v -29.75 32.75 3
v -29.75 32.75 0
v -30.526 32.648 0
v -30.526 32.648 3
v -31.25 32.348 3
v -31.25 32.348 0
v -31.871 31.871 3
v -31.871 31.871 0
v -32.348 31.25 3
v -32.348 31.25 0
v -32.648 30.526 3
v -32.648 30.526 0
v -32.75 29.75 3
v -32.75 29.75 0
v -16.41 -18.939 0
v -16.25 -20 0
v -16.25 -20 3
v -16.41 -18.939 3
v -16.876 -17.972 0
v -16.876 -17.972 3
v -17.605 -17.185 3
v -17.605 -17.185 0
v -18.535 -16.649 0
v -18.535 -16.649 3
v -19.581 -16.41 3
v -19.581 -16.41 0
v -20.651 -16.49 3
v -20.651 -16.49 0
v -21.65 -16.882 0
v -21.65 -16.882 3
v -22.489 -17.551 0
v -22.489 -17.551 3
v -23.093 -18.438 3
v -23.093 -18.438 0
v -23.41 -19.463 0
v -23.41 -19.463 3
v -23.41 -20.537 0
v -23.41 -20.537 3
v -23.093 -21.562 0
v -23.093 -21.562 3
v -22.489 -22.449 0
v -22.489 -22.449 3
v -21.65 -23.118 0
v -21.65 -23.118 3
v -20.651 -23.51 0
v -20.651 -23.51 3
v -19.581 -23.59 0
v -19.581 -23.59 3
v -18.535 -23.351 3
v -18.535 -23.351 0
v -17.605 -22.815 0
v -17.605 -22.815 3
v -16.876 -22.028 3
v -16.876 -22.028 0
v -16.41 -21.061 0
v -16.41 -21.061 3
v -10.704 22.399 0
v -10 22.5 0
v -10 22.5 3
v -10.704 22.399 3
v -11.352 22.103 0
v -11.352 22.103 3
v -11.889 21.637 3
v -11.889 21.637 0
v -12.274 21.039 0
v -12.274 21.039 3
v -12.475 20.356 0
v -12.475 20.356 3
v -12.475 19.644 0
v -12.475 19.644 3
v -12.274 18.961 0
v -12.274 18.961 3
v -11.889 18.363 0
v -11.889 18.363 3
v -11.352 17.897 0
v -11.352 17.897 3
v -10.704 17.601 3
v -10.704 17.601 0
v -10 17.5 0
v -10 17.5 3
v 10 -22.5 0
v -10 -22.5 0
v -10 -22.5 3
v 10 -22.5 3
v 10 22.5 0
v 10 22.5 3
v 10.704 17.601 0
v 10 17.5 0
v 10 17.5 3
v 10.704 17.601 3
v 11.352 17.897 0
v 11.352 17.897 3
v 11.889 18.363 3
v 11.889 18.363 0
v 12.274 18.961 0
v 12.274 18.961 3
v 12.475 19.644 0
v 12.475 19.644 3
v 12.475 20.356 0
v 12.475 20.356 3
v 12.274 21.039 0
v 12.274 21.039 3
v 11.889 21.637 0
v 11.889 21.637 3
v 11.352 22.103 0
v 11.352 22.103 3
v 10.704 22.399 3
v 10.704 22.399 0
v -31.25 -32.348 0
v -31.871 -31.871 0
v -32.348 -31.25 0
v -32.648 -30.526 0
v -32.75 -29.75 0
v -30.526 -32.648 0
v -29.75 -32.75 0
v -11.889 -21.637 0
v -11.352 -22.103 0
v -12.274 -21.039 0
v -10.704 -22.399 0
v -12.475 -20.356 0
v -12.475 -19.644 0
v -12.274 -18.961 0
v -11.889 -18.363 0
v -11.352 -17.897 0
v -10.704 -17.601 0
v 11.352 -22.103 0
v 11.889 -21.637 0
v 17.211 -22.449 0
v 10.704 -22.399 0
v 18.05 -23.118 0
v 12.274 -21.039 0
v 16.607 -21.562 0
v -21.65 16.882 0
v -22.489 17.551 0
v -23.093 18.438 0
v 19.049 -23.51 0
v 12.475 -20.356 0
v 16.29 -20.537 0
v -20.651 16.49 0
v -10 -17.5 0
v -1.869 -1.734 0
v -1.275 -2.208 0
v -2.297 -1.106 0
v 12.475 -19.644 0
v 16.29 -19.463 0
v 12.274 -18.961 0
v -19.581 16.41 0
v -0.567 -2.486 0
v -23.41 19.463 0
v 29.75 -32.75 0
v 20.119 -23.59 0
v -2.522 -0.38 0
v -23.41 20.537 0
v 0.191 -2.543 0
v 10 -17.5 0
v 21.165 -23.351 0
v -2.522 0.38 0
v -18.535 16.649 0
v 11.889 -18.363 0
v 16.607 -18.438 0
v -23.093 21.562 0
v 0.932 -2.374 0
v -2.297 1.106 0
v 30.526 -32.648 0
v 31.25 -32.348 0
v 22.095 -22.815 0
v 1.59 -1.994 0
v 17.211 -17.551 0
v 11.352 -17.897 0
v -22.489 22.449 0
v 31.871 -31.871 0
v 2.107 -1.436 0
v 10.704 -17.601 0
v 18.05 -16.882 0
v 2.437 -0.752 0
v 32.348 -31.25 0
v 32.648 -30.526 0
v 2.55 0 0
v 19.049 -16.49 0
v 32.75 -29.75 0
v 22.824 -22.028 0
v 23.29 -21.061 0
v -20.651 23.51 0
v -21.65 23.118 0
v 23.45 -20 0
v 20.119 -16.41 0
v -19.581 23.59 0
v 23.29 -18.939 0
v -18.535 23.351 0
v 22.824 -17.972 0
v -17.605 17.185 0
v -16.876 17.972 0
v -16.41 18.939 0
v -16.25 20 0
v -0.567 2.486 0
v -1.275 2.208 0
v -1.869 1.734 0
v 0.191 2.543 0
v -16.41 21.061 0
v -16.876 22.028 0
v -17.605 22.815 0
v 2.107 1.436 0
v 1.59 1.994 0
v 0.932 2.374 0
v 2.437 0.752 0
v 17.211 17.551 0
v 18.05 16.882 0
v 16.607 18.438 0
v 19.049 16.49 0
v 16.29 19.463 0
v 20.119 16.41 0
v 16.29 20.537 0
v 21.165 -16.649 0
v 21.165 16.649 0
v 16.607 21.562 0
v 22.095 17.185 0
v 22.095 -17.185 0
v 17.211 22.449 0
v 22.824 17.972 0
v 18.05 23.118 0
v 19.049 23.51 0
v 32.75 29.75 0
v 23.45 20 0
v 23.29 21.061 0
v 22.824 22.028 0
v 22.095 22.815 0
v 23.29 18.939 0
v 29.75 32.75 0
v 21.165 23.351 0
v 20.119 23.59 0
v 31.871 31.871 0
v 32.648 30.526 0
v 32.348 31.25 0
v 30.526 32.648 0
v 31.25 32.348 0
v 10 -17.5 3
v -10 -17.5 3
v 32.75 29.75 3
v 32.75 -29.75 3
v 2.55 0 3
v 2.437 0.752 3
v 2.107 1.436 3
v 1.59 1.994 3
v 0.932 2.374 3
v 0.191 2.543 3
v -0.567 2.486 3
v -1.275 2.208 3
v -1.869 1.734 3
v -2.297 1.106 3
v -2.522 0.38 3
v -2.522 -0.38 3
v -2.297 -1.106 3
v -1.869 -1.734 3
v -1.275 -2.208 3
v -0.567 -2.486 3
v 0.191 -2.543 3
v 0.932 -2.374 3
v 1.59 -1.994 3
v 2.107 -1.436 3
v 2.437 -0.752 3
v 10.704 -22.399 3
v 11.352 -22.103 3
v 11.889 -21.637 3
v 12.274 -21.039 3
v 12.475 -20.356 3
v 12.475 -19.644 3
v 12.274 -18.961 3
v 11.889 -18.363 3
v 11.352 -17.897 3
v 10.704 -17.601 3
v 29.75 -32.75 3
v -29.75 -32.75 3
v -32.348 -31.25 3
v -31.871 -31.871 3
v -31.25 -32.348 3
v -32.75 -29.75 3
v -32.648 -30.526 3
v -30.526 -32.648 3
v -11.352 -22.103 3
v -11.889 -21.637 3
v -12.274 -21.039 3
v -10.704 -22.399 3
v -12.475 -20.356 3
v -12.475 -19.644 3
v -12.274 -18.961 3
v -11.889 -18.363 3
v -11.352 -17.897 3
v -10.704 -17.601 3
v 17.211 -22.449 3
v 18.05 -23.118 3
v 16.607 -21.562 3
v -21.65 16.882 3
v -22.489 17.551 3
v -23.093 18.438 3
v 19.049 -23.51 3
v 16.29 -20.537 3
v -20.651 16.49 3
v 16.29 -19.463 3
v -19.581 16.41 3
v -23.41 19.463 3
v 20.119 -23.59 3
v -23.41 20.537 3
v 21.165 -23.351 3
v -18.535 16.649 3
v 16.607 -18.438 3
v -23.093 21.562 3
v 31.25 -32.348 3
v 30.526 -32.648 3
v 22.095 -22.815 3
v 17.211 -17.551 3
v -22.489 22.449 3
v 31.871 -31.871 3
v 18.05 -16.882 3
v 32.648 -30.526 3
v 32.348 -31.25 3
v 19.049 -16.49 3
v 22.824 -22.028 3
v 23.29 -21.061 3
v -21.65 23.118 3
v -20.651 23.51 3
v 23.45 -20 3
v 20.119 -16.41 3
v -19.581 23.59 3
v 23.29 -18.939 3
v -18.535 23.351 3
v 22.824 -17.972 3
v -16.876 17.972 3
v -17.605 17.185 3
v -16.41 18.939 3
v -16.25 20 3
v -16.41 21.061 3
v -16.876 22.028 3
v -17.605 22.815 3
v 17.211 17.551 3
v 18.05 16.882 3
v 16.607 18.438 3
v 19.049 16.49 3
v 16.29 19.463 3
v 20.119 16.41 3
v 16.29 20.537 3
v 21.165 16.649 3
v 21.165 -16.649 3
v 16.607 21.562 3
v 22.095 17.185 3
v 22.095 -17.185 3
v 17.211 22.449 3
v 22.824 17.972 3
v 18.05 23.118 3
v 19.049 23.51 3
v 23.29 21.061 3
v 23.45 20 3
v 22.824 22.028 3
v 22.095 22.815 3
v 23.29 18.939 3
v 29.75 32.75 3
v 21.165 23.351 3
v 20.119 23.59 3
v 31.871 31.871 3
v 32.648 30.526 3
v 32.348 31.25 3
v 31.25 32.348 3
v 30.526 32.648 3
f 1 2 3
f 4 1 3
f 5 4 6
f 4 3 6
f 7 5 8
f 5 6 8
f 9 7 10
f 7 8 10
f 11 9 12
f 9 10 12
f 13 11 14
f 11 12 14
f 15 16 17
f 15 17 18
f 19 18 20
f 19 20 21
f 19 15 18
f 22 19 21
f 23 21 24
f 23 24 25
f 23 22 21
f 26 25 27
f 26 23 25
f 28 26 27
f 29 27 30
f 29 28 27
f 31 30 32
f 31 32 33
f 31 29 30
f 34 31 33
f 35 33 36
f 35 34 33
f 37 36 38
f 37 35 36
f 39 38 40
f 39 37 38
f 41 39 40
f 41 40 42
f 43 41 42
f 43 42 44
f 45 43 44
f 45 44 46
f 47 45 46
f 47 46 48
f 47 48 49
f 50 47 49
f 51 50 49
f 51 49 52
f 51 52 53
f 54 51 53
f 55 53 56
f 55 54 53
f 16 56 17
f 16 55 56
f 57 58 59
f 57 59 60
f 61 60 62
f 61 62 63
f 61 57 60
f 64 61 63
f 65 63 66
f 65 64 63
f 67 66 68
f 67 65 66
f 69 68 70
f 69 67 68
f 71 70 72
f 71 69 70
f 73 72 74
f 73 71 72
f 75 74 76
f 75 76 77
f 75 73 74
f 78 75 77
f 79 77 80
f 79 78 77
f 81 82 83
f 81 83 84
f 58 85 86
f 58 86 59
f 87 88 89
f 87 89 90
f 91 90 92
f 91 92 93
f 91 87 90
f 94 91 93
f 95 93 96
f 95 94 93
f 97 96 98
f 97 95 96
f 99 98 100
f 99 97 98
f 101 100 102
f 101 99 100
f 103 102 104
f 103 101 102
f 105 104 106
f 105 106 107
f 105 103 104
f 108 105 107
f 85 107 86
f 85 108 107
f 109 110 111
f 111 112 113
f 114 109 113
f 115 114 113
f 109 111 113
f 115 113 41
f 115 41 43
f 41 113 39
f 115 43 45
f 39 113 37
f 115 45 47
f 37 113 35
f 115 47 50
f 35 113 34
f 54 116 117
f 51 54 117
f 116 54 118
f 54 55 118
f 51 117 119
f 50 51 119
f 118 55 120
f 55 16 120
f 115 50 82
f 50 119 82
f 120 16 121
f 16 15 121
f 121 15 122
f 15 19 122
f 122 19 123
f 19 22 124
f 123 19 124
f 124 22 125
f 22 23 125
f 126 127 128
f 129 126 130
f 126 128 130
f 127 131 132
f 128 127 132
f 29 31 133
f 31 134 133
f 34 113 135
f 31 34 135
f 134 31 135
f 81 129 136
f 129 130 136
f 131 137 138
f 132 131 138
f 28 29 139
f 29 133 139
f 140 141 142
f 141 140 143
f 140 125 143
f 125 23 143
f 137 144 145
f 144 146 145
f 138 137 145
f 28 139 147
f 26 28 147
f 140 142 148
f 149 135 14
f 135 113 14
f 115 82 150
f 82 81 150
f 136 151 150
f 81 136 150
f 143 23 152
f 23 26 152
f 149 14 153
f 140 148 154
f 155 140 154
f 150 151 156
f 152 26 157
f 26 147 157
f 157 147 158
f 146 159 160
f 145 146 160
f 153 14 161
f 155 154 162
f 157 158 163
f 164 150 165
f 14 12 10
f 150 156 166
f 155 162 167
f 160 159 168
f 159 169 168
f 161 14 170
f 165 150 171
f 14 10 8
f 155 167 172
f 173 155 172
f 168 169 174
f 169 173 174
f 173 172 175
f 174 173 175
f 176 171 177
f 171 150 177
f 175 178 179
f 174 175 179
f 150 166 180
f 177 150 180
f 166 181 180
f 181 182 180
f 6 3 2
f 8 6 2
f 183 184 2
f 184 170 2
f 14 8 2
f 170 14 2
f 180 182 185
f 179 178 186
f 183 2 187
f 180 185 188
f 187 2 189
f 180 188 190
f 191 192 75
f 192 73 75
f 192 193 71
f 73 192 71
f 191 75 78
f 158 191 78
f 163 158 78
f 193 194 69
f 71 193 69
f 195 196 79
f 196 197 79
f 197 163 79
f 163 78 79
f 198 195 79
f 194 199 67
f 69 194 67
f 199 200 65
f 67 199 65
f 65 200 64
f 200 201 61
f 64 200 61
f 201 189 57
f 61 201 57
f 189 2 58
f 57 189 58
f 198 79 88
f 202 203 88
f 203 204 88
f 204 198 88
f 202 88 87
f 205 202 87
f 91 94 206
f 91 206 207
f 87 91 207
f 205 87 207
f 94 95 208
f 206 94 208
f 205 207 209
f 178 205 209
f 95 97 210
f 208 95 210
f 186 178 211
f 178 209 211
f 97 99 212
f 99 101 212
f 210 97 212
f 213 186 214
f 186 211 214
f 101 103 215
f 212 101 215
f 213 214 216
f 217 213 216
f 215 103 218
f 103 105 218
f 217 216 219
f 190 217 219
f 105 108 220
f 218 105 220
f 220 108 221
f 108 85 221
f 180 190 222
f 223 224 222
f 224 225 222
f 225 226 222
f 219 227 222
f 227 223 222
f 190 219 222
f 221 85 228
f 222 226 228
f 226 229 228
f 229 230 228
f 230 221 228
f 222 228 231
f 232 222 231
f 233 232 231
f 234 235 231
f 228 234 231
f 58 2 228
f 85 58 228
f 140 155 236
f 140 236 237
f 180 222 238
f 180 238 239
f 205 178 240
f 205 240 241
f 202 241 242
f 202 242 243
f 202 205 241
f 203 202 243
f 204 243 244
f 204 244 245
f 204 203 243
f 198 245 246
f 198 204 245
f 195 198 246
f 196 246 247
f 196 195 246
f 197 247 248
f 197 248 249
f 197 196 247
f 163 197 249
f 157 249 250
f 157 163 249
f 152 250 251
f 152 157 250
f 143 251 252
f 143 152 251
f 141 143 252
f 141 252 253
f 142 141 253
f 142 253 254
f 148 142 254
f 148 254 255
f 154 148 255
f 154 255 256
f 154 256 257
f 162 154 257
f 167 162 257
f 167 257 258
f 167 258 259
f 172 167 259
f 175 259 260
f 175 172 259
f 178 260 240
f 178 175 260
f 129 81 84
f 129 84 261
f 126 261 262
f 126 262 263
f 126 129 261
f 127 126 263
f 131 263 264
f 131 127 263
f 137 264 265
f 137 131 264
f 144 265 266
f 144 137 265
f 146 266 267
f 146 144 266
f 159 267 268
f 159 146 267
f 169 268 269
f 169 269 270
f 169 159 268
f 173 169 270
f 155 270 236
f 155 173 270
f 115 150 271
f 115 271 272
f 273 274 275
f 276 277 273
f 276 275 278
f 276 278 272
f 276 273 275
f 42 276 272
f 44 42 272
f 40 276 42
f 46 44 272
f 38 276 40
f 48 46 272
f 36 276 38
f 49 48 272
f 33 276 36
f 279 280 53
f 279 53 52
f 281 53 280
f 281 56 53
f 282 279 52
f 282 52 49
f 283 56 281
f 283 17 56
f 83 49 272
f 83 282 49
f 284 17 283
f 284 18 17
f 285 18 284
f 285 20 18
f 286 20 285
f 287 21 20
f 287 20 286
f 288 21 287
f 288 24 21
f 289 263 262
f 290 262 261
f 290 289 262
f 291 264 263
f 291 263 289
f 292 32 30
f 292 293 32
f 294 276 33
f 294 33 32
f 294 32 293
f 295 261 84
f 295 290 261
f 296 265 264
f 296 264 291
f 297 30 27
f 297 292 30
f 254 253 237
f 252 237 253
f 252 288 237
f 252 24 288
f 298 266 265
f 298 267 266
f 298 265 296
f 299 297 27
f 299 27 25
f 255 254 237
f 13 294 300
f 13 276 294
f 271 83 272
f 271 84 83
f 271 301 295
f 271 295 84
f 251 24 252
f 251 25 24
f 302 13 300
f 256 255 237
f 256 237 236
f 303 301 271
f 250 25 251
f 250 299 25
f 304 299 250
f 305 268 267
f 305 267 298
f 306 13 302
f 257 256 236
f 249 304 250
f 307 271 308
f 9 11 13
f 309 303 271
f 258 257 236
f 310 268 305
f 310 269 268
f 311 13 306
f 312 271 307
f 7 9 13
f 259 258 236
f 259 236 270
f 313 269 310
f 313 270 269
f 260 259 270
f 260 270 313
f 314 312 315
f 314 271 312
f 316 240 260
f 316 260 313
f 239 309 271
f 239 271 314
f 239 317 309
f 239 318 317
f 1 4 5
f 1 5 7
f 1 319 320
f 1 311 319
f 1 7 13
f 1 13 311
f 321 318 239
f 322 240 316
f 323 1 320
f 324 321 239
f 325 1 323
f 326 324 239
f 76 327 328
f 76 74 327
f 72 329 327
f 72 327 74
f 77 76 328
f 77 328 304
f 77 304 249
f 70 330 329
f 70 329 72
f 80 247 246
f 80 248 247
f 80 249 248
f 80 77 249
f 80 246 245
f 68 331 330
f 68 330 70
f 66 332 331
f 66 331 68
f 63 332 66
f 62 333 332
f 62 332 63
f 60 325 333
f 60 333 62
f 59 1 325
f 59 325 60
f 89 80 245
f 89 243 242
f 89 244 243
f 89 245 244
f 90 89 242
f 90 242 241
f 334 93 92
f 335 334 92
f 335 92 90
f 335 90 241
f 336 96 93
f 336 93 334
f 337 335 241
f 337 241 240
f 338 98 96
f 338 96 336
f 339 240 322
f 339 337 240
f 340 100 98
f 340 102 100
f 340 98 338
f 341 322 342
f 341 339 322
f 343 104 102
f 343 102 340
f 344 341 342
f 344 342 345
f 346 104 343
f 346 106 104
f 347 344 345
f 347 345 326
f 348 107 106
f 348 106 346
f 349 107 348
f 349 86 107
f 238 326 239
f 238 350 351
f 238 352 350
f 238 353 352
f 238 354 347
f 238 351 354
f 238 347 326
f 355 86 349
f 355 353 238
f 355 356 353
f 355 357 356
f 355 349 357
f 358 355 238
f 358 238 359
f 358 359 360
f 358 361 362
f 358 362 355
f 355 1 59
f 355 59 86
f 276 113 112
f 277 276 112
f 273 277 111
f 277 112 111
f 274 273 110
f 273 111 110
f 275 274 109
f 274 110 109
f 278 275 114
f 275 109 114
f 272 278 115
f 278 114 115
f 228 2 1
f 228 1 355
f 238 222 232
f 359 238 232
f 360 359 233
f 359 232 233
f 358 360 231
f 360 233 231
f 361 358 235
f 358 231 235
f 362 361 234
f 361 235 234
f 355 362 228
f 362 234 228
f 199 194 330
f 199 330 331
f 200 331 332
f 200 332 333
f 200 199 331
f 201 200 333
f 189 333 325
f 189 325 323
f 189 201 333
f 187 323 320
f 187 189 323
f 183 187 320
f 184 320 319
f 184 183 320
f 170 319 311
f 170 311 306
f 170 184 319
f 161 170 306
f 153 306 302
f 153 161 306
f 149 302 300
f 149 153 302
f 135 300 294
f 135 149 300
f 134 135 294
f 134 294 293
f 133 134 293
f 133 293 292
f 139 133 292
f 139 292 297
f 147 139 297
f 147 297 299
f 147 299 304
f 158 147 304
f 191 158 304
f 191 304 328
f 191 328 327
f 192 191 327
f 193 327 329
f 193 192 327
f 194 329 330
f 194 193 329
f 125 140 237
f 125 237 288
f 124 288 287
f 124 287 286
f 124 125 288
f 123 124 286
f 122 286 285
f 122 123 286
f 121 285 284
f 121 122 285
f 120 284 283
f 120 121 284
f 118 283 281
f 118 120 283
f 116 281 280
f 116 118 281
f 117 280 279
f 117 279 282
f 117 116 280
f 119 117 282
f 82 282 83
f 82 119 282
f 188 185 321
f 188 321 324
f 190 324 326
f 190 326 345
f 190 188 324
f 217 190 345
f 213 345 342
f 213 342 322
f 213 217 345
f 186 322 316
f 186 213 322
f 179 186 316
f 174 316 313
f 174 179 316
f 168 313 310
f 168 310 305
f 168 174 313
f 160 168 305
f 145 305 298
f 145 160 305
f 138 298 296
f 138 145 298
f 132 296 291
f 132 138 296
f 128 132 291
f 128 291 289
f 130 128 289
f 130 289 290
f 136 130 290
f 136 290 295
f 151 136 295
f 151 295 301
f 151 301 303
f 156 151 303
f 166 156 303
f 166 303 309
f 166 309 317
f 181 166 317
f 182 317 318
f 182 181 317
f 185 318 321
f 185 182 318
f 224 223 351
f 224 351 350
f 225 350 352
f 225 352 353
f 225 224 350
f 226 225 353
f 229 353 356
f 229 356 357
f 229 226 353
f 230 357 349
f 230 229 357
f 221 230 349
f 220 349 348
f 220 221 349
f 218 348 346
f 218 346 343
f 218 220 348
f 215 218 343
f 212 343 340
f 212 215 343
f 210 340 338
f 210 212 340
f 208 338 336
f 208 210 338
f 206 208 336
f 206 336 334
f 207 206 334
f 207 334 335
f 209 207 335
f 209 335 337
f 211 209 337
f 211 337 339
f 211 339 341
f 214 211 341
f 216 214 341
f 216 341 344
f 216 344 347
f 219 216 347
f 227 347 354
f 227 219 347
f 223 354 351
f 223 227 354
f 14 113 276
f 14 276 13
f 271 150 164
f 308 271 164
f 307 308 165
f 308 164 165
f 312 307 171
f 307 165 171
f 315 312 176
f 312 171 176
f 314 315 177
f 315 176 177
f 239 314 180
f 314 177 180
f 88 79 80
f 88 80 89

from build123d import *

# Parameters (mm, degrees)
SKETCH_R   = 2.55
SKETCH_R_2 = 3.6
PAD_DEPTH  = 3


with BuildPart() as part:
    # Sketch → Pad (new body)
    with BuildSketch(Plane.XY):
        with BuildLine():
            ThreePointArc((-29.75, 32.75), (-31.87132, 31.87132), (-32.75, 29.75))
            Line((-32.75, -29.75), (-32.75, 29.75))
            ThreePointArc((-32.75, -29.75), (-31.87132, -31.87132), (-29.75, -32.75))
            Line((29.75, -32.75), (-29.75, -32.75))
            ThreePointArc((29.75, -32.75), (31.87132, -31.87132), (32.75, -29.75))
            Line((32.75, 29.75), (32.75, -29.75))
            ThreePointArc((32.75, 29.75), (31.87132, 31.87132), (29.75, 32.75))
            Line((-29.75, 32.75), (29.75, 32.75))
        make_face()
        Circle(SKETCH_R, mode=Mode.SUBTRACT)
        with Locations((-19.85, -20)):
            Circle(SKETCH_R_2, mode=Mode.SUBTRACT)
        with Locations((19.85, -20)):
            Circle(SKETCH_R_2, mode=Mode.SUBTRACT)
        with Locations((19.85, 20)):
            Circle(SKETCH_R_2, mode=Mode.SUBTRACT)
        with Locations((-19.85, 20)):
            Circle(SKETCH_R_2, mode=Mode.SUBTRACT)
        with BuildLine():
            ThreePointArc((-10, -17.5), (-12.5, -20), (-10, -22.5))
            Line((-10, -22.5), (10, -22.5))
            ThreePointArc((10, -22.5), (12.5, -20), (10, -17.5))
            Line((10, -17.5), (-10, -17.5))
        make_face(mode=Mode.SUBTRACT)
        with BuildLine():
            ThreePointArc((-10, 22.5), (-12.5, 20), (-10, 17.5))
            Line((-10, 17.5), (10, 17.5))
            ThreePointArc((10, 17.5), (12.5, 20), (10, 22.5))
            Line((10, 22.5), (-10, 22.5))
        make_face(mode=Mode.SUBTRACT)
    extrude(amount=PAD_DEPTH)


solid = part.part
